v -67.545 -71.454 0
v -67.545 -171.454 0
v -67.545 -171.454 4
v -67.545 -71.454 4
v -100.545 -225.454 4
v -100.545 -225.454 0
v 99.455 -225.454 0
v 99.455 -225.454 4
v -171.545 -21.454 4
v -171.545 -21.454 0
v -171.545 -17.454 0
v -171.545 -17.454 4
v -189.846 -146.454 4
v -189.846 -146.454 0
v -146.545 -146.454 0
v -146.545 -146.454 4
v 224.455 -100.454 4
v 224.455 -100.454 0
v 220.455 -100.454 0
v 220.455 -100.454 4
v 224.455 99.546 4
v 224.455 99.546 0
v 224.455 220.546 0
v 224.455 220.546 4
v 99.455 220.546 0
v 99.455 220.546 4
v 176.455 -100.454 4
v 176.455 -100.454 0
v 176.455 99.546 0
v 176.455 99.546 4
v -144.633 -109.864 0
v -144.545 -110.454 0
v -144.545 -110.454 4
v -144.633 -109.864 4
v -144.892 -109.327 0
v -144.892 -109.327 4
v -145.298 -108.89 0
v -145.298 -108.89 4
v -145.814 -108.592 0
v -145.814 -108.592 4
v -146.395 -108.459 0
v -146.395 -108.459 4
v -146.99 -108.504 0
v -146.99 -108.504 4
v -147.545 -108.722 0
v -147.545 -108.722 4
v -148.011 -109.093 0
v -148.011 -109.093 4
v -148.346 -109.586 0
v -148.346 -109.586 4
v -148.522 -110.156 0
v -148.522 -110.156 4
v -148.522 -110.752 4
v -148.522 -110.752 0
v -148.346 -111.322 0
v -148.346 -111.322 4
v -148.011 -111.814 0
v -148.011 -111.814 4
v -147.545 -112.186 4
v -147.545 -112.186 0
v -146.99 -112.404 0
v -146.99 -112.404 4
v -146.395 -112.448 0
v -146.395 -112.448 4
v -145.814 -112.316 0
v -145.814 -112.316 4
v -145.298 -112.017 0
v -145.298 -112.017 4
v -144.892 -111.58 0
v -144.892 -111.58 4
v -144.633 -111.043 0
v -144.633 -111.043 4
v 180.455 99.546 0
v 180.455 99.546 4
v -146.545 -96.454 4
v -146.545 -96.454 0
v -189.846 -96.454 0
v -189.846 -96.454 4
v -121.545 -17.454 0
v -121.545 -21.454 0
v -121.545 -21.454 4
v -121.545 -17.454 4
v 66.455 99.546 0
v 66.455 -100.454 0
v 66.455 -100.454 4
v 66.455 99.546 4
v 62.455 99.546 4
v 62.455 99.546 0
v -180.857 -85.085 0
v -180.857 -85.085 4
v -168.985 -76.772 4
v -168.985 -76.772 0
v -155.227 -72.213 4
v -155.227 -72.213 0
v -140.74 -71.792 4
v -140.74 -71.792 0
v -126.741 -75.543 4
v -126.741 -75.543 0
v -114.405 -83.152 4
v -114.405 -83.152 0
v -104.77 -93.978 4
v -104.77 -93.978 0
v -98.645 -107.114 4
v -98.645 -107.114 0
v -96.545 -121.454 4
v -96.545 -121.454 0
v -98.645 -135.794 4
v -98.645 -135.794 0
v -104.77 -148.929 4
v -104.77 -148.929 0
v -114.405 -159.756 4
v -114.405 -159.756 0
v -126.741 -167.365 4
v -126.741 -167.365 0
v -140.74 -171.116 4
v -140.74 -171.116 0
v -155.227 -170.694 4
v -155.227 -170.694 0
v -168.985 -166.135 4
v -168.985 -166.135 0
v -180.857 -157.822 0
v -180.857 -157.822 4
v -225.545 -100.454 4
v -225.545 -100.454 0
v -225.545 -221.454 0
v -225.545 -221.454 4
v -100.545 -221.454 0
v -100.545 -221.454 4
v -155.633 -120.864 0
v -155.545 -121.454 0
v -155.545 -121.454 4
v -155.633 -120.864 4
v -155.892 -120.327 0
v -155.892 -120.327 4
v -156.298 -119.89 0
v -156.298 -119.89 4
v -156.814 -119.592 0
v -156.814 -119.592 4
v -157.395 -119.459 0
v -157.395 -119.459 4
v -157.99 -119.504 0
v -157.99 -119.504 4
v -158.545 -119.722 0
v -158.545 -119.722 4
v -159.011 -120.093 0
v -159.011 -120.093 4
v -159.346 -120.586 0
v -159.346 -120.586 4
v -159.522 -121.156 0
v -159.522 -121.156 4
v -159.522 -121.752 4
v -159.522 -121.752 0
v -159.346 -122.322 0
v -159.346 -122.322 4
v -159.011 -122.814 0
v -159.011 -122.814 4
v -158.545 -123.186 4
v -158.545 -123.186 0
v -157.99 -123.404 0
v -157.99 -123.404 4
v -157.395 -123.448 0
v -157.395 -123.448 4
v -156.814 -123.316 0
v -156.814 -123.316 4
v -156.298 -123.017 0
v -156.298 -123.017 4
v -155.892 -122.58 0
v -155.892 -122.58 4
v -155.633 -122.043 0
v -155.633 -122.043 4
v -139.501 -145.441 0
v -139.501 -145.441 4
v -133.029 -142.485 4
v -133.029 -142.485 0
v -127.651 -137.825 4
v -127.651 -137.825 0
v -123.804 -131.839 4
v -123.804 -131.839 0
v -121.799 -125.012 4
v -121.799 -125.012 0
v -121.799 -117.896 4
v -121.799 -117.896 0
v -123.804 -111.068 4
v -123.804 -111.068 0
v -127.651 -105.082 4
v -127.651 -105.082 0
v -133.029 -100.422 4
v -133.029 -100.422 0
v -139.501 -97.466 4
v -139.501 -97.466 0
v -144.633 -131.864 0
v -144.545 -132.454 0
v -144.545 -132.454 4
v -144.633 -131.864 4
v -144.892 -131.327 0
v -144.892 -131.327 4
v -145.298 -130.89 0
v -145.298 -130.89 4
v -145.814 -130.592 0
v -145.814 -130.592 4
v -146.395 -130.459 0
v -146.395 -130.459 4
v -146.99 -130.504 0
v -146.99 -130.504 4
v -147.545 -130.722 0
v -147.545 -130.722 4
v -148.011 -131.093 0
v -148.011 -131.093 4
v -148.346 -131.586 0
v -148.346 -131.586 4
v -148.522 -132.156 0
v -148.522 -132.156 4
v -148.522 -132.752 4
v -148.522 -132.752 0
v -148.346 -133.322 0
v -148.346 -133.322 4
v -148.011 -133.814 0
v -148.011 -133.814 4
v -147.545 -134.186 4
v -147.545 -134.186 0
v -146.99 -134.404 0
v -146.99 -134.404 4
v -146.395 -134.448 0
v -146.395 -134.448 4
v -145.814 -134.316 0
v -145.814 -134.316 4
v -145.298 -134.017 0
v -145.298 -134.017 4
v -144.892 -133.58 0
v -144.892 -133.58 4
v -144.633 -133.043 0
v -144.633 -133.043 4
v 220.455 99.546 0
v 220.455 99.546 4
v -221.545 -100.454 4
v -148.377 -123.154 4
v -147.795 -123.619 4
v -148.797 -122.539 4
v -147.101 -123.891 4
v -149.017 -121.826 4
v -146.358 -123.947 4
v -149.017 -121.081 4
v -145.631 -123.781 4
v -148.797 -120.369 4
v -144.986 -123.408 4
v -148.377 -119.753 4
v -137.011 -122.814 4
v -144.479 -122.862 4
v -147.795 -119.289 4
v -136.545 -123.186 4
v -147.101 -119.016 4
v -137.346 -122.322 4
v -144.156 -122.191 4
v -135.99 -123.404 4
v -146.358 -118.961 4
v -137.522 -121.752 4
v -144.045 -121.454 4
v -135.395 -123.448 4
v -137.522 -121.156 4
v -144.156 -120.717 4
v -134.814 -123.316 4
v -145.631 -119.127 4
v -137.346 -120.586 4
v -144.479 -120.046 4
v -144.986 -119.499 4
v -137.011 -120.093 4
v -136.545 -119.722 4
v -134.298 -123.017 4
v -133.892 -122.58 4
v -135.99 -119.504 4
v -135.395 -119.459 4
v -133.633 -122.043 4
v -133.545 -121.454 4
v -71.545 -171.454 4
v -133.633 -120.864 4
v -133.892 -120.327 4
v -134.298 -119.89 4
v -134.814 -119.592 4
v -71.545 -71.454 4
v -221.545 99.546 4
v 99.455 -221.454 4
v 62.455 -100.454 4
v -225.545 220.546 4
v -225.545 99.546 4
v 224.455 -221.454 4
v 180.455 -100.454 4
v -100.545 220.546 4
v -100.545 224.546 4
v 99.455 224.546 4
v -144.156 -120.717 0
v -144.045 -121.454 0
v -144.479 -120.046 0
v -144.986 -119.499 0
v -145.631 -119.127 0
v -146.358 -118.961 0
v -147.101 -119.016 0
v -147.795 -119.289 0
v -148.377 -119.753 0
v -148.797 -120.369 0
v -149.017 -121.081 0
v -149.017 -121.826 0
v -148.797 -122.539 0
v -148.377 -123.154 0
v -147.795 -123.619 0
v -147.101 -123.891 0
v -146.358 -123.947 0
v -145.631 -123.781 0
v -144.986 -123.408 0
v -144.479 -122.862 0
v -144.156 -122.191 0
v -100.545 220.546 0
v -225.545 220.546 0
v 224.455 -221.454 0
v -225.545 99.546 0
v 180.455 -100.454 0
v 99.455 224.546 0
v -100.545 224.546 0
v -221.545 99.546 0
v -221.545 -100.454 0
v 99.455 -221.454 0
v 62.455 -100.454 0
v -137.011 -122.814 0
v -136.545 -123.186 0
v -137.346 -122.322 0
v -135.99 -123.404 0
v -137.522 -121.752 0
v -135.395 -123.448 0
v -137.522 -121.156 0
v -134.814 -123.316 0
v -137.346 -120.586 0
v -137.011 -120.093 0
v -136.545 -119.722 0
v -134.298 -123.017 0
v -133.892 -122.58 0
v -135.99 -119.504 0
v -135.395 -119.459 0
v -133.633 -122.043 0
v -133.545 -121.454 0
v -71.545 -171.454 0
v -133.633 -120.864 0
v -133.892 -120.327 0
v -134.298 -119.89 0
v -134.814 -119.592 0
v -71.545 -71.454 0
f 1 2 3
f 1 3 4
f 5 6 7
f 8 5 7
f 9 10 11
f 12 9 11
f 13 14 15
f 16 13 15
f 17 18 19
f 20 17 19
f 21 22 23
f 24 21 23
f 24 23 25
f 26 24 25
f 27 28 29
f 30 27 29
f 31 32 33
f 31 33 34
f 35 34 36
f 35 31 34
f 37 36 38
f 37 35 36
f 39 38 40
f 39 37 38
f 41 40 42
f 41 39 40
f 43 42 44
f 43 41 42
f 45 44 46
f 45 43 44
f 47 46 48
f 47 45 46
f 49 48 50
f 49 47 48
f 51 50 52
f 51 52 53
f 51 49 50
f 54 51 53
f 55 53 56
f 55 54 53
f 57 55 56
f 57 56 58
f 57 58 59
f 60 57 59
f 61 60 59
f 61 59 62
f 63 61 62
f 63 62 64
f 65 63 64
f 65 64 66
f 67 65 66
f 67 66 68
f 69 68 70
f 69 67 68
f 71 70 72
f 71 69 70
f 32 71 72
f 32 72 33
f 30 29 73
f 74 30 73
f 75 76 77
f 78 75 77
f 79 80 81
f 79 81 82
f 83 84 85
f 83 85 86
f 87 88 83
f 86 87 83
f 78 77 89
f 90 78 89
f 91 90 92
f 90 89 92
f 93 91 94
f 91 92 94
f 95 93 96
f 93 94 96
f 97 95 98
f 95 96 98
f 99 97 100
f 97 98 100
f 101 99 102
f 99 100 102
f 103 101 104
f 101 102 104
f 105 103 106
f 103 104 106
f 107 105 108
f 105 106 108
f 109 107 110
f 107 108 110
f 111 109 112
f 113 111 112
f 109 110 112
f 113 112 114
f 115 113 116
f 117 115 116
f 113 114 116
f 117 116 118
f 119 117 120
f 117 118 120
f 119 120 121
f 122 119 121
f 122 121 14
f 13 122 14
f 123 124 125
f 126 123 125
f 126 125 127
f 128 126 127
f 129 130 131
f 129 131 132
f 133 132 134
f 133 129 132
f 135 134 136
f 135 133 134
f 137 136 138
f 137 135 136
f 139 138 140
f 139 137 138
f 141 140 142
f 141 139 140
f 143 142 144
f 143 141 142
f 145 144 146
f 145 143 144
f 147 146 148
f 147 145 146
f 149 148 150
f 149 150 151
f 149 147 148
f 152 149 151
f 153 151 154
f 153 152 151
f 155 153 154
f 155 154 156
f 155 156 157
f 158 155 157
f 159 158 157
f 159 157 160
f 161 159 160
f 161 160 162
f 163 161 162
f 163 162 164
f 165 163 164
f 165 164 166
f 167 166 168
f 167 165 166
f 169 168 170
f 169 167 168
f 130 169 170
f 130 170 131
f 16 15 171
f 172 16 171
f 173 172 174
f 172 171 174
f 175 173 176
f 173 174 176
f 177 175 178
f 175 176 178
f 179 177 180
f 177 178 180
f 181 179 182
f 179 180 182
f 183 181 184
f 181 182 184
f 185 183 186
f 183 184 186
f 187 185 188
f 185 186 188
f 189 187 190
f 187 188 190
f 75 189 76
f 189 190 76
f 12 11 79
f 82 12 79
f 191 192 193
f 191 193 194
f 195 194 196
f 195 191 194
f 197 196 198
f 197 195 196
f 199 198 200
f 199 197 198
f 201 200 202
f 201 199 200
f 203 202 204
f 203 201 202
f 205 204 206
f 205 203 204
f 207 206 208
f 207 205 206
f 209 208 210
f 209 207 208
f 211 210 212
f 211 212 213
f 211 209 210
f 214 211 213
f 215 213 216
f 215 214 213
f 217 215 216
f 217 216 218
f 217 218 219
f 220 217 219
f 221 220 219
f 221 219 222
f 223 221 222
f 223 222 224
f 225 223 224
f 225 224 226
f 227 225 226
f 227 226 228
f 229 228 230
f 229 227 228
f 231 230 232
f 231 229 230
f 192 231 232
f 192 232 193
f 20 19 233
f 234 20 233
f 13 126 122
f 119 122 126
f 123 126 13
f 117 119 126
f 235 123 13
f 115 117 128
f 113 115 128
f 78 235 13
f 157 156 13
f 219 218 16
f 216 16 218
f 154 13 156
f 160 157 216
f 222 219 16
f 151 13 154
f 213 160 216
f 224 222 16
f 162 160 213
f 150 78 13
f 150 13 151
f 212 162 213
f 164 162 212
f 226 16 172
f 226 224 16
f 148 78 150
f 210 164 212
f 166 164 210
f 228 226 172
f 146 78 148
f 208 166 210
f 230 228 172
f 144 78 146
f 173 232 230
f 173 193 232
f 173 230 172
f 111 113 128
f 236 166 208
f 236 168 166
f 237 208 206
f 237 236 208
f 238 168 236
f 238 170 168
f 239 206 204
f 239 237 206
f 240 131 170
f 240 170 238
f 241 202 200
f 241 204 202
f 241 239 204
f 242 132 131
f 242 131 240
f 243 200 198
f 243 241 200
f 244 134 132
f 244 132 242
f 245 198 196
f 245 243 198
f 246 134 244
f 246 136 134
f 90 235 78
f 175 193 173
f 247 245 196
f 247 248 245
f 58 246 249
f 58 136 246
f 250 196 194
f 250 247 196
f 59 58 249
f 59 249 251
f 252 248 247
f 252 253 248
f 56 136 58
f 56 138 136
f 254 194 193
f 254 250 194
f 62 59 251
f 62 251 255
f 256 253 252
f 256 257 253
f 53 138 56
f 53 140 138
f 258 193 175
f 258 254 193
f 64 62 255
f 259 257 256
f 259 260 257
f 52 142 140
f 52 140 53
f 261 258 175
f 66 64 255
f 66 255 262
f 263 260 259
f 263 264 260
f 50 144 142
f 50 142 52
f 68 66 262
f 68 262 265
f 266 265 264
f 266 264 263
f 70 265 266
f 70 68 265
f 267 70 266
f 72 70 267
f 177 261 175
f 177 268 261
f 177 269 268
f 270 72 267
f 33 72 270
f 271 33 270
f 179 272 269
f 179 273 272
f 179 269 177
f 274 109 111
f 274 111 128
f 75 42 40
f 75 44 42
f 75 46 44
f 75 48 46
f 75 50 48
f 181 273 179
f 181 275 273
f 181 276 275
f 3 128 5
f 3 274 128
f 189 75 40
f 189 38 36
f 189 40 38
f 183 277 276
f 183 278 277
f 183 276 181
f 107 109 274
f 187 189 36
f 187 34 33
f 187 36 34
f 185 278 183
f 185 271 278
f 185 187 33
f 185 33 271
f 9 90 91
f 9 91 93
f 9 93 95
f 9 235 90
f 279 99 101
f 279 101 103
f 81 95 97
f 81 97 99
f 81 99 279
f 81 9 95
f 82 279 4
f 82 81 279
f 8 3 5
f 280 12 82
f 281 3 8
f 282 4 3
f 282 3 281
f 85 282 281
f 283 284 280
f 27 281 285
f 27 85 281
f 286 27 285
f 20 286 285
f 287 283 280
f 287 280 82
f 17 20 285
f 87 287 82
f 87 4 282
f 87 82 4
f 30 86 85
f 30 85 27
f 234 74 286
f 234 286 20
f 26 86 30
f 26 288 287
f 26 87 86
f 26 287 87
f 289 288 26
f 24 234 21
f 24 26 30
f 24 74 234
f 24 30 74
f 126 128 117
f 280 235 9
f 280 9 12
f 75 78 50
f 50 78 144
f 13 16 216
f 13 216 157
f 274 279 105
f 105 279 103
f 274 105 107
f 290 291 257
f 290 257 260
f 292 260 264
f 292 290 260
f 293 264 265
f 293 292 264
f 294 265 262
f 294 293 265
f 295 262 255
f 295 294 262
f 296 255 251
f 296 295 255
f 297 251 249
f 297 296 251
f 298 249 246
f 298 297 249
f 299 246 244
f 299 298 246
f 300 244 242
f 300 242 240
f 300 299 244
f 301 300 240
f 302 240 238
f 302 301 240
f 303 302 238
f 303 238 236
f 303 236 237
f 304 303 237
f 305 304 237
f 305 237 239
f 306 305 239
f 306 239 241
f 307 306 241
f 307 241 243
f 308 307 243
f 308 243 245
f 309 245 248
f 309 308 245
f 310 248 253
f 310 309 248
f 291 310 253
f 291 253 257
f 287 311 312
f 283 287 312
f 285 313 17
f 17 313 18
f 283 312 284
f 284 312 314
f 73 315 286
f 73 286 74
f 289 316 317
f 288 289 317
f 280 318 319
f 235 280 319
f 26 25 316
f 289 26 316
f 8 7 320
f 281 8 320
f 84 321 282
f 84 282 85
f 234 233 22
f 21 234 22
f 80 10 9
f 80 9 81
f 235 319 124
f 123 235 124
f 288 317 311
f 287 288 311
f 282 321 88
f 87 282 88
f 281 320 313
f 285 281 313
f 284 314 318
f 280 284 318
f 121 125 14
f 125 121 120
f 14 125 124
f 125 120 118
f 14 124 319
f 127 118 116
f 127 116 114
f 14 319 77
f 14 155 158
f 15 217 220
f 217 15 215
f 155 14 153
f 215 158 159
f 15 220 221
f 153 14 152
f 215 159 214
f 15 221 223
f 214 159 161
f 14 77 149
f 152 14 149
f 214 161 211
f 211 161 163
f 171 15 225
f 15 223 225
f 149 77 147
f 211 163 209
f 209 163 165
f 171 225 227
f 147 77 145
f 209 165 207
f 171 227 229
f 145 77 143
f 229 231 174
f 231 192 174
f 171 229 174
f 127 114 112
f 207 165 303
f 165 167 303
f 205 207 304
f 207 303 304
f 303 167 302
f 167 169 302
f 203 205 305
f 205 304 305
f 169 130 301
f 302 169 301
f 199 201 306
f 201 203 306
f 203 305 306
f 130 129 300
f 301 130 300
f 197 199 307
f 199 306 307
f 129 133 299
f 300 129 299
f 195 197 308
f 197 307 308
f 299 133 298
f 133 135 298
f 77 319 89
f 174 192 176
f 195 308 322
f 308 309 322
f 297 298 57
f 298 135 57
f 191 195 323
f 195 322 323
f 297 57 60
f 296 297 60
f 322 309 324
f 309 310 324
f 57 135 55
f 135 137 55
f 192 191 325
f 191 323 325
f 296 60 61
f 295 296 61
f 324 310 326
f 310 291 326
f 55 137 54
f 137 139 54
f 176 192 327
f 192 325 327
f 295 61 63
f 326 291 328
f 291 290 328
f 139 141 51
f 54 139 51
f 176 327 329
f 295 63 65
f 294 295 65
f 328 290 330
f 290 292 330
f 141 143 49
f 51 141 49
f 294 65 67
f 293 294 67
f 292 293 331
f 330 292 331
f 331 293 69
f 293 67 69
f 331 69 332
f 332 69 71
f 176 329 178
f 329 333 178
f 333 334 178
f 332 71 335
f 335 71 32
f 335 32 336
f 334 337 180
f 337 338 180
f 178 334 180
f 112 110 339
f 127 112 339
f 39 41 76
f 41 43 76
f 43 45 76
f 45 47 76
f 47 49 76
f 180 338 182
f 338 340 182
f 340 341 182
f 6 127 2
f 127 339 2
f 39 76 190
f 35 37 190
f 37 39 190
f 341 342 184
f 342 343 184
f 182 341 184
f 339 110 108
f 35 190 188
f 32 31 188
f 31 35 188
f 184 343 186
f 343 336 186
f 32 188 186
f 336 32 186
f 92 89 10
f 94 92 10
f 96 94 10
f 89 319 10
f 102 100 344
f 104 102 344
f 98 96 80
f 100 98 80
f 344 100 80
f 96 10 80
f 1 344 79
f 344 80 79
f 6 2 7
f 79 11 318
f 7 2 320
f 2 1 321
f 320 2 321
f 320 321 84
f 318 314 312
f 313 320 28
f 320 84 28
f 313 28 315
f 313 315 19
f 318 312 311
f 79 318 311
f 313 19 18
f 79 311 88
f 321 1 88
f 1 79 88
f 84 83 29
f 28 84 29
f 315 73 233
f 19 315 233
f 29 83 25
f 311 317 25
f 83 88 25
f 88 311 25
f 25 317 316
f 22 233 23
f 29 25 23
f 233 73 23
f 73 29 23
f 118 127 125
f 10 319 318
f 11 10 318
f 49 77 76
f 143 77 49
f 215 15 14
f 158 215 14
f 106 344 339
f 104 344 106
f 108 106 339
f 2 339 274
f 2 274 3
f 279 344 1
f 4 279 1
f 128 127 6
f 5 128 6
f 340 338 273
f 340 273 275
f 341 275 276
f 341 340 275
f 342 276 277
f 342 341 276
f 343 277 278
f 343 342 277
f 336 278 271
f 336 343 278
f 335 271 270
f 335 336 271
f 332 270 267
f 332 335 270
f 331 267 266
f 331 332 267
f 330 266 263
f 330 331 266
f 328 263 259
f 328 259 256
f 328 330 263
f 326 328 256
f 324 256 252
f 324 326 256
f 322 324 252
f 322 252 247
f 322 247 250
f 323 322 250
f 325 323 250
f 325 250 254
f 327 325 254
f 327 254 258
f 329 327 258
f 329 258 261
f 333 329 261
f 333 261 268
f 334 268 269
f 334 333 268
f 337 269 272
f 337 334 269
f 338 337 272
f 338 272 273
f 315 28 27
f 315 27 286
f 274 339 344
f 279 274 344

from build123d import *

# Parameters (mm, degrees)
SKETCH1_R           = 2
SKETCH1_R_2         = 2.5
SKETCH1_W           = 50
SKETCH1_H           = 4
SKETCH1_W_2         = 4
SKETCH1_H_2         = 100
SKETCH1_H_3         = 200
BOSS_EXTRUDE1_DEPTH = 4


with BuildPart() as part:
    # Sketch1 → Boss-Extrude1 (new body)
    with BuildSketch(Plane.XY):
        Polygon((-225.544562063, -221.45380172), (-100.544562063, -221.45380172), (-100.544562063, -225.45380172), (99.455437937, -225.45380172), (99.455437937, -221.45380172), (224.455437937, -221.45380172), (224.455437937, -100.45380172), (220.455437937, -100.45380172), (220.455437937, 99.54619828), (224.455437937, 99.54619828), (224.455437937, 220.54619828), (99.455437937, 220.54619828), (99.455437937, 224.54619828), (-100.544562063, 224.54619828), (-100.544562063, 220.54619828), (-225.544562063, 220.54619828), (-225.544562063, 99.54619828), (-221.544562063, 99.54619828), (-221.544562063, -100.45380172), (-225.544562063, -100.45380172), align=None)
        with Locations((-135.544562063, -121.45380172)):
            Circle(SKETCH1_R, mode=Mode.SUBTRACT)
        with Locations((-146.544562063, -110.45380172)):
            Circle(SKETCH1_R, mode=Mode.SUBTRACT)
        with Locations((-157.544562063, -121.45380172)):
            Circle(SKETCH1_R, mode=Mode.SUBTRACT)
        with Locations((-146.544562063, -132.45380172)):
            Circle(SKETCH1_R, mode=Mode.SUBTRACT)
        with Locations((-146.544562063, -121.45380172)):
            Circle(SKETCH1_R_2, mode=Mode.SUBTRACT)
        with BuildLine():
            Line((-146.544562063, -96.45380172), (-189.845832253, -96.45380172))
            ThreePointArc((-189.845832253, -96.45380172), (-96.544562063, -121.45380172), (-189.845832253, -146.45380172))
            Line((-189.845832253, -146.45380172), (-146.544562063, -146.45380172))
            ThreePointArc((-146.544562063, -146.45380172), (-121.544562063, -121.45380172), (-146.544562063, -96.45380172))
        make_face(mode=Mode.SUBTRACT)
        with Locations((-146.544562063, -19.45380172)):
            Rectangle(SKETCH1_W, SKETCH1_H, mode=Mode.SUBTRACT)
        with Locations((-69.544562063, -121.45380172)):
            Rectangle(SKETCH1_W_2, SKETCH1_H_2, mode=Mode.SUBTRACT)
        with Locations((64.455437937, -0.45380172)):
            Rectangle(SKETCH1_W_2, SKETCH1_H_3, mode=Mode.SUBTRACT)
        with Locations((178.455437937, -0.45380172)):
            Rectangle(SKETCH1_W_2, SKETCH1_H_3, mode=Mode.SUBTRACT)
    extrude(amount=BOSS_EXTRUDE1_DEPTH)


solid = part.part
